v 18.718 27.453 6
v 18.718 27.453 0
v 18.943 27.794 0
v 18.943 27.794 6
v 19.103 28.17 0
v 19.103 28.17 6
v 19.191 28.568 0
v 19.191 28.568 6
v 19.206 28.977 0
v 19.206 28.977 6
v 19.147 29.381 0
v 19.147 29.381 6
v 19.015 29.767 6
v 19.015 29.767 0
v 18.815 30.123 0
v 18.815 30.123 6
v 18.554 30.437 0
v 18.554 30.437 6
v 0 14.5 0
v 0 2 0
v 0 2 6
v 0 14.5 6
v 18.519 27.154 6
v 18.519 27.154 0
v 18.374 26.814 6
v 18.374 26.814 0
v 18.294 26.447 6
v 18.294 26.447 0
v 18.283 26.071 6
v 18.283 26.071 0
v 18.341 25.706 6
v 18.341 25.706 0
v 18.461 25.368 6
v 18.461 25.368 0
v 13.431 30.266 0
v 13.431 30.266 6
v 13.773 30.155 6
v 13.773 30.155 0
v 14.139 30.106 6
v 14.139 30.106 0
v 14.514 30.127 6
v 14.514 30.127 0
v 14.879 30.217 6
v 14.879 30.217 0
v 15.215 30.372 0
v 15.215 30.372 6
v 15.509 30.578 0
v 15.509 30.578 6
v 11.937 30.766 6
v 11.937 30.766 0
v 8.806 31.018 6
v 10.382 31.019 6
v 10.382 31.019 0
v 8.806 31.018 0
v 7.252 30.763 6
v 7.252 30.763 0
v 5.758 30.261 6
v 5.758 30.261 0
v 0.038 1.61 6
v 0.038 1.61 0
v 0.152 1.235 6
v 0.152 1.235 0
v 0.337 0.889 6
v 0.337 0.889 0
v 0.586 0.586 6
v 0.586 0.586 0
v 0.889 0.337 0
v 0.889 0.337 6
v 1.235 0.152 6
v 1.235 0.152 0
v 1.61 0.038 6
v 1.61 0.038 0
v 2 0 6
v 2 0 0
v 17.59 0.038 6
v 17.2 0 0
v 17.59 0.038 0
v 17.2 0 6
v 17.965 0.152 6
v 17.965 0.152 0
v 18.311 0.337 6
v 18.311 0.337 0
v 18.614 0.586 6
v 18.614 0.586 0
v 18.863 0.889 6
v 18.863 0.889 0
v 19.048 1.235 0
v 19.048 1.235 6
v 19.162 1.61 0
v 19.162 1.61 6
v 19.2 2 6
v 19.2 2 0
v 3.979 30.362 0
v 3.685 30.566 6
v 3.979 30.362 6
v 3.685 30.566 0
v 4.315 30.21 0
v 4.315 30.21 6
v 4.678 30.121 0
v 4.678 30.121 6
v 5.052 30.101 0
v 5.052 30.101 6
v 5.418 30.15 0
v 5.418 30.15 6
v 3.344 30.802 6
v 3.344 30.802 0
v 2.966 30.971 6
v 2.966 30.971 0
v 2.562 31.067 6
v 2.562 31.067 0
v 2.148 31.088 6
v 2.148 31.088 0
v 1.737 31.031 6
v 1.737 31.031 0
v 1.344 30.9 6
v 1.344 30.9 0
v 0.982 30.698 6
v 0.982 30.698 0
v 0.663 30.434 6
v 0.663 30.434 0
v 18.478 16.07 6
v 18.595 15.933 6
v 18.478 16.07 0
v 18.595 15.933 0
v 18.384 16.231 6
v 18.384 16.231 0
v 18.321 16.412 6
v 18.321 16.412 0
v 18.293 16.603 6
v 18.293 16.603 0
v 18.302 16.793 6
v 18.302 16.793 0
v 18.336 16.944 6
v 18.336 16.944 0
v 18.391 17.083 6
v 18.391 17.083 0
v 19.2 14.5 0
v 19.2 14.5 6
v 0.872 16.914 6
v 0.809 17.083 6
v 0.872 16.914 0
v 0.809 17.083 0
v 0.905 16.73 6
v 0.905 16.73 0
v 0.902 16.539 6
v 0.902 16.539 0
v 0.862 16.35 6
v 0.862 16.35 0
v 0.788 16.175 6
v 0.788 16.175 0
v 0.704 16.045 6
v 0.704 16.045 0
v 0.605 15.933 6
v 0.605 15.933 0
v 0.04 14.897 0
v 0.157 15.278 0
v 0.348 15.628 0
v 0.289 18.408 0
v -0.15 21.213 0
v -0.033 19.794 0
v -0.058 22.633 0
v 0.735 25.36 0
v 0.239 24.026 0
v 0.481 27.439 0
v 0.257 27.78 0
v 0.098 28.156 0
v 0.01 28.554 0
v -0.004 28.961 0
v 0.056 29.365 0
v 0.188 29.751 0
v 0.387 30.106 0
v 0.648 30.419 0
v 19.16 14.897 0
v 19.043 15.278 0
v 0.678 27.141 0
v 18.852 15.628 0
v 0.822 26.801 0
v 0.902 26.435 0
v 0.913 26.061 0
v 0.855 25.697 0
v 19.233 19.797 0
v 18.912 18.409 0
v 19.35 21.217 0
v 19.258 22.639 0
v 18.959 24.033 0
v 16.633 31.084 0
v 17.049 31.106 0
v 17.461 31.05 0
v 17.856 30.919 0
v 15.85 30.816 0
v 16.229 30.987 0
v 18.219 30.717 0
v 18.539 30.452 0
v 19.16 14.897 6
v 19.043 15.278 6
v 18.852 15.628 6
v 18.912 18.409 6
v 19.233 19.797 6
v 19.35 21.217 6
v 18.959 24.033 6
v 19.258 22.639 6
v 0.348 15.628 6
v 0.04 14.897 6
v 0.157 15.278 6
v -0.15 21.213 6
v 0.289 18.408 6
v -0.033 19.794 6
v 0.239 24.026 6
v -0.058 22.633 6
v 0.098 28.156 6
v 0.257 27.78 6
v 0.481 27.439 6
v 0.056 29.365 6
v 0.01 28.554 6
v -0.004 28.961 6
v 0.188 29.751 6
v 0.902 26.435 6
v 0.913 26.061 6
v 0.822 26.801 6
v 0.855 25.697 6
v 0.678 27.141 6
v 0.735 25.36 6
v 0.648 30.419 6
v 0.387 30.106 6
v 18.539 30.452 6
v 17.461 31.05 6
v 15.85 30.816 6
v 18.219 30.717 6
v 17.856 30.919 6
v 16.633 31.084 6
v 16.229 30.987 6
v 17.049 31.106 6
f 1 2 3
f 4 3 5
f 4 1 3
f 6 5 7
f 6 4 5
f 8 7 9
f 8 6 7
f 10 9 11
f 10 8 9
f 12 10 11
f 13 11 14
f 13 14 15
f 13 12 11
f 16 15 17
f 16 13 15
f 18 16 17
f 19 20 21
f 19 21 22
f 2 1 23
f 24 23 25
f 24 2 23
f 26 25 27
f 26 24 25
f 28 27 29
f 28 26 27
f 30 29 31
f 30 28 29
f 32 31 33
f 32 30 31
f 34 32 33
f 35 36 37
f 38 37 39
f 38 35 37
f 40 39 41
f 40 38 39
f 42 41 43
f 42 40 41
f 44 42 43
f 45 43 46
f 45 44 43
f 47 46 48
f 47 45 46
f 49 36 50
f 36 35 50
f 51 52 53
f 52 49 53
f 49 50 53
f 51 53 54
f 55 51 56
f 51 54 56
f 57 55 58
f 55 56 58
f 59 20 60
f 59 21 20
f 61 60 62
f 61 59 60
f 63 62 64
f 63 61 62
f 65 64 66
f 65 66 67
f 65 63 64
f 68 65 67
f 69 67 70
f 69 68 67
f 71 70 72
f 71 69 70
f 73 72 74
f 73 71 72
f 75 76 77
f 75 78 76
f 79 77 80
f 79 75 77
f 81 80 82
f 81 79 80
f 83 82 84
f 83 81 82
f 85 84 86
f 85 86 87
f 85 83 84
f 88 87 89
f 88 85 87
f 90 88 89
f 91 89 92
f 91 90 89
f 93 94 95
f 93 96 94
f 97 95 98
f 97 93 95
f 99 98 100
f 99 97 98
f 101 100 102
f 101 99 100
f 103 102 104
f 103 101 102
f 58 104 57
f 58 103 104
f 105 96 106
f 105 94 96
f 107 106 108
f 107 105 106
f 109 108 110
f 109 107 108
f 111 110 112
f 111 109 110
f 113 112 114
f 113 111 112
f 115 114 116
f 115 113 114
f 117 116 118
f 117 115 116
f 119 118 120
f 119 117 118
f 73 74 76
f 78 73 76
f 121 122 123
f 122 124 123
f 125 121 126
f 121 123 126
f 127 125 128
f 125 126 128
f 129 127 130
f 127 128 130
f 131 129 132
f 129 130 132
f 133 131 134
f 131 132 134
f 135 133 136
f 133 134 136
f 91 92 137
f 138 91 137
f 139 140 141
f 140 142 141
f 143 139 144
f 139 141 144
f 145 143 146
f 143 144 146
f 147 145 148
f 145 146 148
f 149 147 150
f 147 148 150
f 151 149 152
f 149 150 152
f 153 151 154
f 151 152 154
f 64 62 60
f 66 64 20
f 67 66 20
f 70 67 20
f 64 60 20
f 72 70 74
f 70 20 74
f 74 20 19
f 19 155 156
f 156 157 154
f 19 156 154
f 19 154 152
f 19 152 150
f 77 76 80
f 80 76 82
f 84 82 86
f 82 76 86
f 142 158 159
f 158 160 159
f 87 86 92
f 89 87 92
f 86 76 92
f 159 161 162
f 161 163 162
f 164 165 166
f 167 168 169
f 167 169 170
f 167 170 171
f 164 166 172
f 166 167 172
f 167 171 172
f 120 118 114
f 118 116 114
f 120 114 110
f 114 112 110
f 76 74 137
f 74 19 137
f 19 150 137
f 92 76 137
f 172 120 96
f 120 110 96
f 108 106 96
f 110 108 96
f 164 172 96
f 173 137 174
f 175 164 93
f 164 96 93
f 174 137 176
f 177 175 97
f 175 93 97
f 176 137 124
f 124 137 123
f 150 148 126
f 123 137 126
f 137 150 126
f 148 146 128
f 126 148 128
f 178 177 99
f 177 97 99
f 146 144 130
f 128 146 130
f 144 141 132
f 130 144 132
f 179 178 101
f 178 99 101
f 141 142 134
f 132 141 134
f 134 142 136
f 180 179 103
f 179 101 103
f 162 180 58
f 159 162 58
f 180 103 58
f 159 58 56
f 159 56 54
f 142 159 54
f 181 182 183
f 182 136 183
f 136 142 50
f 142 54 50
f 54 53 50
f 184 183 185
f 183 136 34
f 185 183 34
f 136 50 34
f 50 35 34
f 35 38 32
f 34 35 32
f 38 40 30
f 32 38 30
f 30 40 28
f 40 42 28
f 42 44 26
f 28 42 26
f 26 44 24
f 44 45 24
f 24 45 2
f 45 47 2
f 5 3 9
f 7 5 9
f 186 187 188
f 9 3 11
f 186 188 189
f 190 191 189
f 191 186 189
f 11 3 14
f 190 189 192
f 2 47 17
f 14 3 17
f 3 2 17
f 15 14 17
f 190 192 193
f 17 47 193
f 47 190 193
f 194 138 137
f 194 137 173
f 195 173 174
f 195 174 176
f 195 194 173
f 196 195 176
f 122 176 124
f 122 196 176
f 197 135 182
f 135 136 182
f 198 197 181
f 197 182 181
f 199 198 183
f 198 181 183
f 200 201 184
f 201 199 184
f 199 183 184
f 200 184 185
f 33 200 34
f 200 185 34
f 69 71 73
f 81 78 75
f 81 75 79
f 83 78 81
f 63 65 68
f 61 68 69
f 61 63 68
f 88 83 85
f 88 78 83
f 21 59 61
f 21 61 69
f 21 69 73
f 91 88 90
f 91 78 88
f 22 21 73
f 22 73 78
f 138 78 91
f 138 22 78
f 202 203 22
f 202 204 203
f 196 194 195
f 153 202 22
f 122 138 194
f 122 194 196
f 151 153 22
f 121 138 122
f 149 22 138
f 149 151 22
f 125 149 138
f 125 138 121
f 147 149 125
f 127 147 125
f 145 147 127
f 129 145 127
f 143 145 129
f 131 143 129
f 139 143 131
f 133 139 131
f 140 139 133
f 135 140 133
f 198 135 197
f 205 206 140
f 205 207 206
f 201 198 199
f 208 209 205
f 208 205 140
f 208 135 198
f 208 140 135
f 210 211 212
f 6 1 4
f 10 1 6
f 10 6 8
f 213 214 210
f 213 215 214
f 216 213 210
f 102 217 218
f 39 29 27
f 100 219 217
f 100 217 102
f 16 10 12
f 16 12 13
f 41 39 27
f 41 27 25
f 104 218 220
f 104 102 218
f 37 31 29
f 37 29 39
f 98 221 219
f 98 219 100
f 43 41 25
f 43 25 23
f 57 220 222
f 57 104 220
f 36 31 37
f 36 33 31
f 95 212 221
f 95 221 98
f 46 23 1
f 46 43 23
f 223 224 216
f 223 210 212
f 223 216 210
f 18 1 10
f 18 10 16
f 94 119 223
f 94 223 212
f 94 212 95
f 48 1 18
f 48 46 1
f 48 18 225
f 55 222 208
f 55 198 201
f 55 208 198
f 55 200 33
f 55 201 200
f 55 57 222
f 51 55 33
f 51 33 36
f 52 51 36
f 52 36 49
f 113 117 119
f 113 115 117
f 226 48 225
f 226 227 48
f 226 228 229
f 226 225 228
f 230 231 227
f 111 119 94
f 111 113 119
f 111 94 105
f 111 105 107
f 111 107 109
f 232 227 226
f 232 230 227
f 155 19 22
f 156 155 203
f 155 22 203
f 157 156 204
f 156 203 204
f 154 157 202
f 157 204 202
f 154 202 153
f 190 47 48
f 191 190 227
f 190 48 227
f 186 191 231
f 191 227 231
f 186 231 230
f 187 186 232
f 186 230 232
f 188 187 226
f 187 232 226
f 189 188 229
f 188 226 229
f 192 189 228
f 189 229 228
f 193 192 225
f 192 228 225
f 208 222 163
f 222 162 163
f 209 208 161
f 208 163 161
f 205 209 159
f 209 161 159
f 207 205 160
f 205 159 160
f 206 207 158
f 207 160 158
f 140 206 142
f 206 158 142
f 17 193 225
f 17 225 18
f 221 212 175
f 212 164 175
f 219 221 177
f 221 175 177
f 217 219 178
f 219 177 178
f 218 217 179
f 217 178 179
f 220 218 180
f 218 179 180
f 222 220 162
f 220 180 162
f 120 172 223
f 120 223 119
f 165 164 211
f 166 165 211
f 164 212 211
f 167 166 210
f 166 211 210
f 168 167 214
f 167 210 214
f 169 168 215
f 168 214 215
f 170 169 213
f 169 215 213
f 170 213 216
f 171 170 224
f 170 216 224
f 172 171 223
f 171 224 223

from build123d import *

# Parameters (mm, degrees)
BOX003_W               = 4.5
BOX003_H               = 5
BOX003_DEPTH           = 6
BOX003_PLACEMENT_ANGLE = 315
FILLET004_R            = 2.24
BOX002_W               = 19.2
BOX002_H               = 16.5
BOX002_DEPTH           = 6
FILLET005_R            = 2
BOX006_W               = 4.5
BOX006_H               = 5
BOX006_DEPTH           = 6
BOX006_PLACEMENT_ANGLE = 315
FILLET006_R            = 2.24
CYLINDER_R             = 9.75
CYLINDER_DEPTH         = 6
FILLET007_1_R          = 2
FILLET007_2_R          = 1


with BuildPart() as fillet004:
    # Box003 → Box003 (new body)
    with BuildSketch(Plane.XY):
        with Locations((2.25, 2.5)):
            Rectangle(BOX003_W, BOX003_H)
    extrude(amount=BOX003_DEPTH)


with BuildPart() as fillet004_1:
    # Box003 placement: moved
    add(fillet004.part.moved(Location((13.42, 28.5, 0))).rotate(Axis((13.42, 28.5, 0), (0, 0, 1)), BOX003_PLACEMENT_ANGLE))

    # Fillet004
    fillet004_edges = [fillet004_1.edges().sort_by_distance(p)[0] for p in [
        (16.955534, 32.035534, 3),
        (20.137514, 28.853553, 3),
    ]]
    fillet(fillet004_edges, radius=FILLET004_R)


with BuildPart() as fillet005:
    # Box002 → Box002 (new body)
    with BuildSketch(Plane.XY):
        with Locations((9.6, 8.25)):
            Rectangle(BOX002_W, BOX002_H)
    extrude(amount=BOX002_DEPTH)

    # Fillet005
    fillet005_edges = [fillet005.edges().sort_by_distance(p)[0] for p in [
        (0, 0, 3),
        (0, 16.5, 3),
        (19.2, 0, 3),
        (19.2, 16.5, 3),
    ]]
    fillet(fillet005_edges, radius=FILLET005_R)


with BuildPart() as fillet006:
    # Box006 → Box006 (new body)
    with BuildSketch(Plane.XY):
        with Locations((2.25, 2.5)):
            Rectangle(BOX006_W, BOX006_H)
    extrude(amount=BOX006_DEPTH)


with BuildPart() as fillet006_1:
    # Box006 placement: moved
    add(fillet006.part.moved(Location((2.6, 25.3, 0))).rotate(Axis((2.6, 25.3, 0), (0, 0, -1)), BOX006_PLACEMENT_ANGLE))

    # Fillet006
    fillet006_edges = [fillet006_1.edges().sort_by_distance(p)[0] for p in [
        (-0.935534, 28.835534, 3),
        (2.246447, 32.017514, 3),
    ]]
    fillet(fillet006_edges, radius=FILLET006_R)


with BuildPart() as fillet007:
    # Cylinder → Cylinder (new body)
    with BuildSketch(Plane(origin=(9.6, 21.3, 0), x_dir=(1, 0, 0), z_dir=(0, 0, 1))):
        Circle(CYLINDER_R)
    extrude(amount=CYLINDER_DEPTH)

    # Fusion025: union Fillet004, Fillet005, Fillet006
    add(fillet004_1.part)
    add(fillet005.part)
    add(fillet006_1.part)

    # Fillet007 1
    fillet007_1_edges = [fillet007.edges().sort_by_distance(p)[0] for p in [
        (4.596011, 29.66795, 3),
        (14.593947, 29.673947, 3),
        (17.822898, 26.538937, 3),
        (1.370866, 26.529134, 3),
    ]]
    fillet(fillet007_1_edges, radius=FILLET007_1_R)

    # Fillet007 2
    fillet007_2_edges = [fillet007.edges().sort_by_distance(p)[0] for p in [
        (1.207976, 16.336491, 3),
        (17.992024, 16.336491, 3),
    ]]
    fillet(fillet007_2_edges, radius=FILLET007_2_R)


solid = fillet007.part
